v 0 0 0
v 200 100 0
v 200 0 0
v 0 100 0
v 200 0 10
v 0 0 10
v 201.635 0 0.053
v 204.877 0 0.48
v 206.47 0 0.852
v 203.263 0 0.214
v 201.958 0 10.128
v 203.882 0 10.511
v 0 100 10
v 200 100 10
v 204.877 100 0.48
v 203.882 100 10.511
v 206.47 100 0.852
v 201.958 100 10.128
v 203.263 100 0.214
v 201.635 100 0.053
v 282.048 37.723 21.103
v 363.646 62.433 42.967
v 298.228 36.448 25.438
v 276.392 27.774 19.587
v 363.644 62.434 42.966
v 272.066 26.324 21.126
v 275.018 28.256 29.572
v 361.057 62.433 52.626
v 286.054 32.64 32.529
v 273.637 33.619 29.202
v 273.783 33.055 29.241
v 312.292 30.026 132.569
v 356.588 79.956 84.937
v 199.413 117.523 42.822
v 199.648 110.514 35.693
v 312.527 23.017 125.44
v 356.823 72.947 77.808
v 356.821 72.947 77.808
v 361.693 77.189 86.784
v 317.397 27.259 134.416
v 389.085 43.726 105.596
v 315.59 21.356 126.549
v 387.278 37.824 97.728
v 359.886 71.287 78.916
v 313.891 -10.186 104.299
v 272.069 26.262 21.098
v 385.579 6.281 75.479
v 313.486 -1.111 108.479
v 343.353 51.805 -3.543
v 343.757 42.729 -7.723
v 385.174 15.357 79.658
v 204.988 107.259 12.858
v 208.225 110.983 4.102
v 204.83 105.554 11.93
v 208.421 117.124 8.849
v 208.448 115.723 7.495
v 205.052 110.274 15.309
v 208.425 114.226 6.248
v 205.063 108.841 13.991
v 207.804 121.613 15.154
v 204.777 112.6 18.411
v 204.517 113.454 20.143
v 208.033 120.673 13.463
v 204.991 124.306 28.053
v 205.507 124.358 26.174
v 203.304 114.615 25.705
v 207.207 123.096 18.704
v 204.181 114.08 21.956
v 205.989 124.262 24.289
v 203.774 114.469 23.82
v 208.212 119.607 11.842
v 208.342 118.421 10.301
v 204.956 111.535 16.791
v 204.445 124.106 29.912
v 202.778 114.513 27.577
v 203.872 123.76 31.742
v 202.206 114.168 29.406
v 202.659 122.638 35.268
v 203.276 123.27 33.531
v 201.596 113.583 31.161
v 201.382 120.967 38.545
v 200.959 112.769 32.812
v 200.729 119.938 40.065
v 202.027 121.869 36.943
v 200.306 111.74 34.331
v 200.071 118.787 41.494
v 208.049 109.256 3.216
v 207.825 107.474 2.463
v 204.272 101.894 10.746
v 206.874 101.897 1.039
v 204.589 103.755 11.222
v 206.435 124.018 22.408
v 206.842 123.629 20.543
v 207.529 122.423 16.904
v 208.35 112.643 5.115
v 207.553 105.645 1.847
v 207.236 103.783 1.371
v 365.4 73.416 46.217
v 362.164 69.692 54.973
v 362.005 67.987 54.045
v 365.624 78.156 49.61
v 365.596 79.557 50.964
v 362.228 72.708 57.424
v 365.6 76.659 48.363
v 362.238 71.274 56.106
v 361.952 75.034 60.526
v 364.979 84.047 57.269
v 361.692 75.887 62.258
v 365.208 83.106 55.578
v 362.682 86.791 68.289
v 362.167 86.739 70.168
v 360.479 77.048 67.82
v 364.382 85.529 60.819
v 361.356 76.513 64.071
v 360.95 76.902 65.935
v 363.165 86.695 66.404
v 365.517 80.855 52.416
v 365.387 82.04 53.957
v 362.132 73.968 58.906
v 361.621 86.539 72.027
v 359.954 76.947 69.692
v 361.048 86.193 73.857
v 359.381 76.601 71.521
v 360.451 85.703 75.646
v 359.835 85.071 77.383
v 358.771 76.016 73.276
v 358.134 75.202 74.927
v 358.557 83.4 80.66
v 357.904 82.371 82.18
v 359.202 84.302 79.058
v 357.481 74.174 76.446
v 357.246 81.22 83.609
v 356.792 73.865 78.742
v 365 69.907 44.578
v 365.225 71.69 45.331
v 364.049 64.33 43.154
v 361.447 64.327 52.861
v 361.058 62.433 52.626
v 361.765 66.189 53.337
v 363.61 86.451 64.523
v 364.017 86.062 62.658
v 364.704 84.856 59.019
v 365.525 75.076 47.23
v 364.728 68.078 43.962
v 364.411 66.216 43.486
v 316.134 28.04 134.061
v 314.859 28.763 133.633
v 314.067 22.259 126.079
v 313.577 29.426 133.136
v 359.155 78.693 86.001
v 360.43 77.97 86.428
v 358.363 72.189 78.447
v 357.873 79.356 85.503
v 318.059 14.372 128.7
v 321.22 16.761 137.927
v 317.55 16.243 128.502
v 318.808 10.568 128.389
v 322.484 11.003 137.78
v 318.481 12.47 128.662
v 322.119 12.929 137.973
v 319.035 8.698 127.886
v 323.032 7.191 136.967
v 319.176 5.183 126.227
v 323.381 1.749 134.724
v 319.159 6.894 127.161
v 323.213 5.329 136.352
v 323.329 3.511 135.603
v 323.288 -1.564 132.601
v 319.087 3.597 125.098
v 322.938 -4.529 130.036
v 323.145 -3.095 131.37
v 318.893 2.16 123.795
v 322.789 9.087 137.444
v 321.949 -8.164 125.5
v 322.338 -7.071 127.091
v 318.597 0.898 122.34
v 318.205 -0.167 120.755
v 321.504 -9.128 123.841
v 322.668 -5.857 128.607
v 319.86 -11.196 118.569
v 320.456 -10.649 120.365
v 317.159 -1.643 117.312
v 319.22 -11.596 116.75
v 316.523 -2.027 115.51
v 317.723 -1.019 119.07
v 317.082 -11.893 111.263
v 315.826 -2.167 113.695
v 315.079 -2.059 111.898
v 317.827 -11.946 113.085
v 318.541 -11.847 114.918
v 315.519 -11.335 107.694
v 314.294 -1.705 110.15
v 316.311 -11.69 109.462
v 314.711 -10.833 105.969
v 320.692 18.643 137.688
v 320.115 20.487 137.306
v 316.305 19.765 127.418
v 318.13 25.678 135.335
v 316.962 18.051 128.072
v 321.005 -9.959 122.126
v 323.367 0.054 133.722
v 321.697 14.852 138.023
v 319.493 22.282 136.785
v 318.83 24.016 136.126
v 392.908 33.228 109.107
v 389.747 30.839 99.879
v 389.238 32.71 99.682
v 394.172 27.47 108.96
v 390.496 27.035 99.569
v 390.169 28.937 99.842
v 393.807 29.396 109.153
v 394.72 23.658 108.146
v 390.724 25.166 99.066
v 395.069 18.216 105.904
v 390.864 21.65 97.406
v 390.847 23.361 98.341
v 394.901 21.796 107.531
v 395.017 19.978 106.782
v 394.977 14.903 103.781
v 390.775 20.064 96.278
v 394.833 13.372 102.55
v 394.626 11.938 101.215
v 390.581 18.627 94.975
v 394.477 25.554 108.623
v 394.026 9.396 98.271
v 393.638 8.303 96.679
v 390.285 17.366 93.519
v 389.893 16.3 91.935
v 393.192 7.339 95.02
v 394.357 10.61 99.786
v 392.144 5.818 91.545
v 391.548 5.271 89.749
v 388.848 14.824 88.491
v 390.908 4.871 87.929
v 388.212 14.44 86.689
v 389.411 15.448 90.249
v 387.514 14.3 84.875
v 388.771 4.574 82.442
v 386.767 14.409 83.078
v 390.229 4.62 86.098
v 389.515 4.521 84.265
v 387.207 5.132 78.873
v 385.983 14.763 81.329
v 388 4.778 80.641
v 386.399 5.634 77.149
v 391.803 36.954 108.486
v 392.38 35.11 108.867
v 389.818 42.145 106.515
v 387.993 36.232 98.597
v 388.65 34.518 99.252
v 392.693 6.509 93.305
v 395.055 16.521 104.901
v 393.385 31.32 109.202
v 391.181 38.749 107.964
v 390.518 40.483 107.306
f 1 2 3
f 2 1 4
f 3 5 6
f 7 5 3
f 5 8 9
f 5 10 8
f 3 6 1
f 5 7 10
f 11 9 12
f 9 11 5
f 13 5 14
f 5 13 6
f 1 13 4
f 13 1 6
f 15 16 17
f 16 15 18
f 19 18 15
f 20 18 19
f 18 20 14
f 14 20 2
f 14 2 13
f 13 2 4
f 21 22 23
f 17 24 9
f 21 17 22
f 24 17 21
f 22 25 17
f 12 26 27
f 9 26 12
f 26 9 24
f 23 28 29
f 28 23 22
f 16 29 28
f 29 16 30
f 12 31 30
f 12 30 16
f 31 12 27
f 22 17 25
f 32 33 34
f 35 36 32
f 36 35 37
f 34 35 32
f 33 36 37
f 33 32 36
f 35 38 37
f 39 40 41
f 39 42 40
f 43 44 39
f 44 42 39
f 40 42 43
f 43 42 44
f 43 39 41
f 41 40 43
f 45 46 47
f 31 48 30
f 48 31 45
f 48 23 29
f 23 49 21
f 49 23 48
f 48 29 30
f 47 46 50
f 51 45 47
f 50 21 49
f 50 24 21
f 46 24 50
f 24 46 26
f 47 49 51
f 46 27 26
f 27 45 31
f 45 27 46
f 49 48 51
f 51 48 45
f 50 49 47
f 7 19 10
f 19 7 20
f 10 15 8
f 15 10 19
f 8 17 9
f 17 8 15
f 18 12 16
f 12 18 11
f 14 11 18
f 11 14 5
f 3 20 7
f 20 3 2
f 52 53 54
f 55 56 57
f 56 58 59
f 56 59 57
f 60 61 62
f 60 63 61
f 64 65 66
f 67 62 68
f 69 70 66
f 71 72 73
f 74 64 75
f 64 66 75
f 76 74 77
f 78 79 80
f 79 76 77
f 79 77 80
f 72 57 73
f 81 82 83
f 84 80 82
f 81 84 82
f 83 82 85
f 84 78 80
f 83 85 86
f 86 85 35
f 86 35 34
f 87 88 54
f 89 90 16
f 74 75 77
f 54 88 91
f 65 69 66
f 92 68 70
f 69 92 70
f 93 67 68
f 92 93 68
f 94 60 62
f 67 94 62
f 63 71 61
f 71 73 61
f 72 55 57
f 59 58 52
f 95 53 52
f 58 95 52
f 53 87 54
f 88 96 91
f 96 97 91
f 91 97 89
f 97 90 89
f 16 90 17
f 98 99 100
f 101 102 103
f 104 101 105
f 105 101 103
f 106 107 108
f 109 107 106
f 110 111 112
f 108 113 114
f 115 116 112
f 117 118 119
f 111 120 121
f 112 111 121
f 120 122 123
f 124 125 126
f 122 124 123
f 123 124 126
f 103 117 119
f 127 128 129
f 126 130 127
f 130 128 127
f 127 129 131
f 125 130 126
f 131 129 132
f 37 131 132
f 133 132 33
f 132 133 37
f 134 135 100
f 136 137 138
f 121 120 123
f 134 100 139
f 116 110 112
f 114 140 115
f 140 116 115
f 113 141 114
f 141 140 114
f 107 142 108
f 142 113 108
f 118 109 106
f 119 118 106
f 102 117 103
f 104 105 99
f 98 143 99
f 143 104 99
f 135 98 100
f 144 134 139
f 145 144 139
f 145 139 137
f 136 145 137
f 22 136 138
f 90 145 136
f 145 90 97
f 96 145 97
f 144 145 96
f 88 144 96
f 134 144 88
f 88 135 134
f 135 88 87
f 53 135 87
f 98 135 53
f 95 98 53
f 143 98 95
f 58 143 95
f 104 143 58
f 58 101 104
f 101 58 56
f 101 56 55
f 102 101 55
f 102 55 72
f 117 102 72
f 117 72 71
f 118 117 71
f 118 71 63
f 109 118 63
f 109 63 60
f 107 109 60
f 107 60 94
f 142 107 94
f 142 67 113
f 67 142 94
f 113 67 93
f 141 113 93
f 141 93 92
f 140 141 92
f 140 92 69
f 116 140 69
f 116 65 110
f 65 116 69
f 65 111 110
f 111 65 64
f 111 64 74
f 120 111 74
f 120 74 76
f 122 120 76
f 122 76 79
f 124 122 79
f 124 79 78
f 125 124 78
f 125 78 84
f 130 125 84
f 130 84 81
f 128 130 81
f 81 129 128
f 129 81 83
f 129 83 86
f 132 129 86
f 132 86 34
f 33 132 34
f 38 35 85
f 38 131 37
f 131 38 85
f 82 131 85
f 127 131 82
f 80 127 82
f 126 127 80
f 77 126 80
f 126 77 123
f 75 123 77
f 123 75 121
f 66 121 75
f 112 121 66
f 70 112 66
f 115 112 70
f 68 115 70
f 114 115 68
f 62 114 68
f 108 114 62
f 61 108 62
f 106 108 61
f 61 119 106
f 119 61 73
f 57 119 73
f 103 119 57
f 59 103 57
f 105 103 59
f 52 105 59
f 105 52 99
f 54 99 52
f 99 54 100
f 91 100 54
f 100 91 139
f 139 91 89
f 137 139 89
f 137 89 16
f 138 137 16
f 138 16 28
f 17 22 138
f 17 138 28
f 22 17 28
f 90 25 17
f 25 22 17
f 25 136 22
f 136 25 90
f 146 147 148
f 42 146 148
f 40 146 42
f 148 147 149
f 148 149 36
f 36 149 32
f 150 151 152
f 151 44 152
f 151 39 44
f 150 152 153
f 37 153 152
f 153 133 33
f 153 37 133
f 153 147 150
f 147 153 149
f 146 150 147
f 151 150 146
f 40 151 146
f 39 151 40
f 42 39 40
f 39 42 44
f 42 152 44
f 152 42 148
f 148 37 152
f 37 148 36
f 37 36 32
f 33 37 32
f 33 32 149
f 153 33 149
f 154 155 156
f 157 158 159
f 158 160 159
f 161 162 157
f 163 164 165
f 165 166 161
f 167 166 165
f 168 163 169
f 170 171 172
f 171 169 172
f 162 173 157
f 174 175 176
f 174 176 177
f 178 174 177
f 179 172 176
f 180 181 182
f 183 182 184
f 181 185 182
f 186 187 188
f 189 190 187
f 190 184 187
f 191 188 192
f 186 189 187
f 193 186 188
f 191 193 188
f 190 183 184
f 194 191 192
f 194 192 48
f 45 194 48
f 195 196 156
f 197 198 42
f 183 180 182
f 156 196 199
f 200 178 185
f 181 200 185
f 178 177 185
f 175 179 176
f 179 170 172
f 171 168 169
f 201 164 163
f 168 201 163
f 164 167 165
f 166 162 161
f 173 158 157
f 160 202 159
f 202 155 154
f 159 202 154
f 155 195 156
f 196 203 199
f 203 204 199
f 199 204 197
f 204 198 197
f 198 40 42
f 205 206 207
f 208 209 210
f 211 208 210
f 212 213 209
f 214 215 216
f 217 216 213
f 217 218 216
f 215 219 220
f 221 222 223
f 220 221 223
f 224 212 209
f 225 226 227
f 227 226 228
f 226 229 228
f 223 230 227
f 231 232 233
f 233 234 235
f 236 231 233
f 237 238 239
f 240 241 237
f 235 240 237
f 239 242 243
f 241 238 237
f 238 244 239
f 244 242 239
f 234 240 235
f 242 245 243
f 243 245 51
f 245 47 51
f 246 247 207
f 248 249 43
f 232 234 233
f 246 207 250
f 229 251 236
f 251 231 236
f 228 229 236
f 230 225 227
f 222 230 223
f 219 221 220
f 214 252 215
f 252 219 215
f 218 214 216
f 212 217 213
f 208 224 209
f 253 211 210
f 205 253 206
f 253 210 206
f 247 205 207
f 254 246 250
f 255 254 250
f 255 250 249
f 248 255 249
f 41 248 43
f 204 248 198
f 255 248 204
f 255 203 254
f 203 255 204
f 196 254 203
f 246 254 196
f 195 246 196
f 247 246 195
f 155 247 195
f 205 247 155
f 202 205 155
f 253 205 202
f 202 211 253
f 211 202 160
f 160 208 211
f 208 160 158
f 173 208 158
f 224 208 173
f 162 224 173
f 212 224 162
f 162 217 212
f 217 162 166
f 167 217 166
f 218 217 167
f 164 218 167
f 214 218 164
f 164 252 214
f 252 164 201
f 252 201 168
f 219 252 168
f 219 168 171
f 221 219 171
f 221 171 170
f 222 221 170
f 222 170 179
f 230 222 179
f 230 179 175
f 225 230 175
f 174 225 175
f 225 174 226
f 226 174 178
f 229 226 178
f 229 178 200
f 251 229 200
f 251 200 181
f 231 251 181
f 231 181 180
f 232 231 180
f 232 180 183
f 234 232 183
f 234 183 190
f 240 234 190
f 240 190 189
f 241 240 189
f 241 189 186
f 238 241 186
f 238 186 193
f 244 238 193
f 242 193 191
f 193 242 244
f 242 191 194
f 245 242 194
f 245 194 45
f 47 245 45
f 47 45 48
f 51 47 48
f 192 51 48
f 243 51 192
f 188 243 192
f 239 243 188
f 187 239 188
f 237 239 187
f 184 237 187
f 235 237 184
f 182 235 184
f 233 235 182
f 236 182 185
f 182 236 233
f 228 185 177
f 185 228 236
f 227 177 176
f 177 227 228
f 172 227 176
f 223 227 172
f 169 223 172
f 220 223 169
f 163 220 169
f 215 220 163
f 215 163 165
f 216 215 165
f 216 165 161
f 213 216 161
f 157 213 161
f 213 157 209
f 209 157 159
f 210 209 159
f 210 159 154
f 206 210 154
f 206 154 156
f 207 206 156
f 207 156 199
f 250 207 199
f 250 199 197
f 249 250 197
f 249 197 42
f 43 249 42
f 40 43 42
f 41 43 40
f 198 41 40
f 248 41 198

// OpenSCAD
// Generated by Parametrix
ca_demoSheetFold2_SFG_pattern_000 = [ [ 0.0000, 0.0000 ],[ 200.0000, 0.0000 ],[ 205.2360, 0.0000 ],[ 367.9558, 62.4332 ],[ 378.4778, 108.0092 ],[ 383.3648, 108.0092 ],[ 427.5410, 124.5152 ],[ 470.6599, 153.5993 ],[ 553.5637, 209.5186 ],[ 509.3874, 275.0125 ],[ 426.4837, 219.0932 ],[ 383.3648, 190.0092 ],[ 378.4778, 190.0092 ],[ 215.7580, 145.5760 ],[ 205.2360, 100.0000 ],[ 200.0000, 100.0000 ],[ 0.0000, 100.0000 ],[ 0.0000, 0.0000 ] ];
cb_demoSheetFold2_SFG_pattern_000 = [  0, 1, 2, 3, 4, 5, 6, 7, 8, 9, 10, 11, 12, 13, 14, 15, 16, 17 ];
ca_demoSheetFold2_SFG_pattern_001 = [ [ 0.0000, 0.0000 ],[ 200.0000, 0.0000 ],[ 205.2360, 0.0000 ],[ 367.9558, 62.4332 ],[ 378.4778, 108.0092 ],[ 383.3648, 108.0092 ],[ 427.5410, 124.5152 ],[ 470.6599, 153.5993 ],[ 553.5637, 209.5186 ],[ 509.3874, 275.0125 ],[ 426.4837, 219.0932 ],[ 383.3648, 190.0092 ],[ 378.4778, 190.0092 ],[ 215.7580, 145.5760 ],[ 205.2360, 100.0000 ],[ 200.0000, 100.0000 ],[ 0.0000, 100.0000 ],[ 0.0000, 0.0000 ] ];
cb_demoSheetFold2_SFG_pattern_001 = [  18, 19, 20, 21, 22, 23, 24, 25, 26, 27, 28, 29, 30, 31, 32, 33, 34, 35 ];
ca_demoSheetFold2_SFG_pattern_002 = [ [ 204.2360, 49.0000 ],[ 204.4311, 49.0192 ],[ 204.6187, 49.0761 ],[ 204.7916, 49.1685 ],[ 204.9431, 49.2929 ],[ 205.0675, 49.4444 ],[ 205.1599, 49.6173 ],[ 205.2168, 49.8049 ],[ 205.2360, 50.0000 ],[ 205.2168, 50.1951 ],[ 205.1599, 50.3827 ],[ 205.0675, 50.5556 ],[ 204.9431, 50.7071 ],[ 204.7916, 50.8315 ],[ 204.6187, 50.9239 ],[ 204.4311, 50.9808 ],[ 204.2360, 51.0000 ],[ 201.0000, 51.0000 ],[ 200.8049, 50.9808 ],[ 200.6173, 50.9239 ],[ 200.4444, 50.8315 ],[ 200.2929, 50.7071 ],[ 200.1685, 50.5556 ],[ 200.0761, 50.3827 ],[ 200.0192, 50.1951 ],[ 200.0000, 50.0000 ],[ 200.0192, 49.8049 ],[ 200.0761, 49.6173 ],[ 200.1685, 49.4444 ],[ 200.2929, 49.2929 ],[ 200.4444, 49.1685 ],[ 200.6173, 49.0761 ],[ 200.8049, 49.0192 ],[ 201.0000, 49.0000 ],[ 204.2360, 49.0000 ] ];
cb_demoSheetFold2_SFG_pattern_002 = [  36, 37, 38, 39, 40, 41, 42, 43, 44, 45, 46, 47, 48, 49, 50, 51, 52, 53, 54, 55, 56, 57, 58, 59, 60, 61, 62, 63, 64, 65, 66, 67, 68, 69, 70 ];
ca_demoSheetFold2_SFG_pattern_003 = [ [ 285.8465, 82.4159 ],[ 285.8217, 82.2330 ],[ 285.8310, 82.0487 ],[ 285.8740, 81.8693 ],[ 285.9492, 81.7008 ],[ 286.0541, 81.5490 ],[ 286.1852, 81.4190 ],[ 286.3378, 81.3153 ],[ 286.5069, 81.2415 ],[ 286.6868, 81.2000 ],[ 286.8711, 81.1922 ],[ 287.0538, 81.2185 ],[ 287.2285, 81.2778 ],[ 287.3894, 81.3683 ],[ 287.5308, 81.4868 ],[ 287.6482, 81.6292 ],[ 287.7373, 81.7908 ],[ 287.7952, 81.9660 ],[ 297.8674, 125.5933 ],[ 297.8921, 125.7761 ],[ 297.8828, 125.9604 ],[ 297.8398, 126.1399 ],[ 297.7646, 126.3084 ],[ 297.6597, 126.4602 ],[ 297.5287, 126.5902 ],[ 297.3760, 126.6938 ],[ 297.2069, 126.7677 ],[ 297.0271, 126.8092 ],[ 296.8427, 126.8169 ],[ 296.6600, 126.7907 ],[ 296.4853, 126.7313 ],[ 296.3245, 126.6409 ],[ 296.1830, 126.5224 ],[ 296.0657, 126.3799 ],[ 295.9765, 126.2184 ],[ 295.9186, 126.0432 ],[ 285.8465, 82.4159 ] ];
cb_demoSheetFold2_SFG_pattern_003 = [  71, 72, 73, 74, 75, 76, 77, 78, 79, 80, 81, 82, 83, 84, 85, 86, 87, 88, 89, 90, 91, 92, 93, 94, 95, 96, 97, 98, 99, 100, 101, 102, 103, 104, 105, 106, 107 ];
ca_demoSheetFold2_SFG_pattern_004 = [ [ 382.3648, 148.0092 ],[ 382.5598, 148.0284 ],[ 382.7474, 148.0853 ],[ 382.9203, 148.1777 ],[ 383.0719, 148.3021 ],[ 383.1962, 148.4536 ],[ 383.2886, 148.6265 ],[ 383.3455, 148.8141 ],[ 383.3648, 149.0092 ],[ 383.3455, 149.2043 ],[ 383.2886, 149.3918 ],[ 383.1962, 149.5647 ],[ 383.0719, 149.7163 ],[ 382.9203, 149.8406 ],[ 382.7474, 149.9330 ],[ 382.5598, 149.9899 ],[ 382.3648, 150.0092 ],[ 379.4778, 150.0092 ],[ 379.2827, 149.9899 ],[ 379.0952, 149.9330 ],[ 378.9223, 149.8406 ],[ 378.7707, 149.7163 ],[ 378.6464, 149.5647 ],[ 378.5540, 149.3918 ],[ 378.4970, 149.2043 ],[ 378.4778, 149.0092 ],[ 378.4970, 148.8141 ],[ 378.5540, 148.6265 ],[ 378.6464, 148.4536 ],[ 378.7707, 148.3021 ],[ 378.9223, 148.1777 ],[ 379.0952, 148.0853 ],[ 379.2827, 148.0284 ],[ 379.4778, 148.0092 ],[ 382.3648, 148.0092 ] ];
cb_demoSheetFold2_SFG_pattern_004 = [  108, 109, 110, 111, 112, 113, 114, 115, 116, 117, 118, 119, 120, 121, 122, 123, 124, 125, 126, 127, 128, 129, 130, 131, 132, 133, 134, 135, 136, 137, 138, 139, 140, 141, 142 ];
ca_demoSheetFold2_SFG_pattern_005 = [ [ 448.3019, 184.9580 ],[ 448.4448, 185.0749 ],[ 448.5637, 185.2160 ],[ 448.6546, 185.3766 ],[ 448.7145, 185.5511 ],[ 448.7413, 185.7337 ],[ 448.7341, 185.9181 ],[ 448.6932, 186.0980 ],[ 448.6199, 186.2674 ],[ 448.5167, 186.4204 ],[ 448.3871, 186.5518 ],[ 448.2356, 186.6572 ],[ 448.0674, 186.7329 ],[ 447.8880, 186.7765 ],[ 447.7038, 186.7863 ],[ 447.5208, 186.7621 ],[ 447.3454, 186.7047 ],[ 447.1836, 186.6161 ],[ 405.7227, 158.6504 ],[ 405.5717, 158.5254 ],[ 405.4480, 158.3733 ],[ 405.3564, 158.2000 ],[ 405.3003, 158.0122 ],[ 405.2819, 157.8170 ],[ 405.3020, 157.6220 ],[ 405.3597, 157.4347 ],[ 405.4529, 157.2622 ],[ 405.5779, 157.1112 ],[ 405.7300, 156.9875 ],[ 405.9033, 156.8958 ],[ 406.0911, 156.8397 ],[ 406.2863, 156.8214 ],[ 406.4813, 156.8414 ],[ 406.6686, 156.8992 ],[ 406.8411, 156.9923 ],[ 448.3019, 184.9580 ] ];
cb_demoSheetFold2_SFG_pattern_005 = [  143, 144, 145, 146, 147, 148, 149, 150, 151, 152, 153, 154, 155, 156, 157, 158, 159, 160, 161, 162, 163, 164, 165, 166, 167, 168, 169, 170, 171, 172, 173, 174, 175, 176, 177, 178 ];
a_demoSheetFold2_SFG_pattern = concat(ca_demoSheetFold2_SFG_pattern_000, ca_demoSheetFold2_SFG_pattern_001, ca_demoSheetFold2_SFG_pattern_002, ca_demoSheetFold2_SFG_pattern_003, ca_demoSheetFold2_SFG_pattern_004, ca_demoSheetFold2_SFG_pattern_005);
b_demoSheetFold2_SFG_pattern = [cb_demoSheetFold2_SFG_pattern_000, cb_demoSheetFold2_SFG_pattern_001, cb_demoSheetFold2_SFG_pattern_002, cb_demoSheetFold2_SFG_pattern_003, cb_demoSheetFold2_SFG_pattern_004, cb_demoSheetFold2_SFG_pattern_005];
ca_demoSheetFold2_SFG_profiles_000 = [ [ 0.0000, 0.0000 ],[ 200.0000, 0.0000 ],[ 200.0000, 10.0000 ],[ 0.0000, 10.0000 ],[ 0.0000, 0.0000 ] ];
cb_demoSheetFold2_SFG_profiles_000 = [  0, 1, 2, 3, 4 ];
ca_demoSheetFold2_SFG_profiles_001 = [ [ 200.0000, 0.0000 ],[ 201.6351, 0.0535 ],[ 203.2632, 0.2139 ],[ 204.8773, 0.4804 ],[ 206.4705, 0.8519 ],[ 203.8823, 10.5111 ],[ 201.9579, 10.1283 ],[ 200.0000, 10.0000 ],[ 200.0000, 0.0000 ] ];
cb_demoSheetFold2_SFG_profiles_001 = [  5, 6, 7, 8, 9, 10, 11, 12, 13 ];
ca_demoSheetFold2_SFG_profiles_002 = [ [ 206.4705, 0.8519 ],[ 374.8179, 45.9604 ],[ 372.2297, 55.6197 ],[ 203.8823, 10.5111 ],[ 206.4705, 0.8519 ] ];
cb_demoSheetFold2_SFG_profiles_002 = [  14, 15, 16, 17, 18 ];
ca_demoSheetFold2_SFG_profiles_003 = [ [ 374.8179, 45.9604 ],[ 376.6789, 46.5377 ],[ 378.4893, 47.2581 ],[ 380.2380, 48.1173 ],[ 381.9146, 49.1102 ],[ 383.5087, 50.2305 ],[ 385.0107, 51.4717 ],[ 386.4115, 52.8260 ],[ 387.7026, 54.2853 ],[ 388.8761, 55.8407 ],[ 389.9250, 57.4828 ],[ 390.8427, 59.2016 ],[ 391.6238, 60.9866 ],[ 392.2635, 62.8271 ],[ 392.7580, 64.7118 ],[ 393.1041, 66.6292 ],[ 393.2999, 68.5678 ],[ 393.3441, 70.5158 ],[ 393.2365, 72.4613 ],[ 392.9776, 74.3925 ],[ 392.5692, 76.2976 ],[ 392.0136, 78.1652 ],[ 391.3143, 79.9838 ],[ 390.4755, 81.7425 ],[ 389.5022, 83.4305 ],[ 388.4005, 85.0375 ],[ 387.1769, 86.5539 ],[ 385.8390, 87.9704 ],[ 384.3948, 89.2784 ],[ 382.8531, 90.4699 ],[ 381.2234, 91.5377 ],[ 376.0730, 82.9661 ],[ 377.6738, 81.8567 ],[ 379.1173, 80.5493 ],[ 380.3793, 79.0659 ],[ 381.4384, 77.4315 ],[ 382.2769, 75.6737 ],[ 382.8805, 73.8220 ],[ 383.2391, 71.9077 ],[ 383.3467, 69.9631 ],[ 383.2014, 68.0210 ],[ 382.8058, 66.1140 ],[ 382.1663, 64.2744 ],[ 381.2939, 62.5331 ],[ 380.2033, 60.9195 ],[ 378.9128, 59.4609 ],[ 377.4442, 58.1817 ],[ 375.8222, 57.1037 ],[ 374.0742, 56.2448 ],[ 372.2297, 55.6197 ],[ 374.8179, 45.9604 ] ];
cb_demoSheetFold2_SFG_profiles_003 = [  19, 20, 21, 22, 23, 24, 25, 26, 27, 28, 29, 30, 31, 32, 33, 34, 35, 36, 37, 38, 39, 40, 41, 42, 43, 44, 45, 46, 47, 48, 49, 50, 51, 52, 53, 54, 55, 56, 57, 58, 59, 60, 61, 62, 63, 64, 65, 66, 67, 68, 69 ];
ca_demoSheetFold2_SFG_profiles_004 = [ [ 381.2234, 91.5377 ],[ 380.3662, 92.0528 ],[ 375.2158, 83.4811 ],[ 376.0730, 82.9661 ],[ 381.2234, 91.5377 ] ];
cb_demoSheetFold2_SFG_profiles_004 = [  70, 71, 72, 73, 74 ];
ca_demoSheetFold2_SFG_profiles_005 = [ [ 380.3662, 92.0528 ],[ 379.0340, 92.7989 ],[ 377.6587, 93.4622 ],[ 376.2454, 94.0404 ],[ 374.7995, 94.5312 ],[ 371.8758, 84.9682 ],[ 373.5913, 84.3268 ],[ 375.2158, 83.4811 ],[ 380.3662, 92.0528 ] ];
cb_demoSheetFold2_SFG_profiles_005 = [  75, 76, 77, 78, 79, 80, 81, 82, 83 ];
ca_demoSheetFold2_SFG_profiles_006 = [ [ 374.7995, 94.5312 ],[ 329.7010, 108.3192 ],[ 326.7773, 98.7562 ],[ 371.8758, 84.9682 ],[ 374.7995, 94.5312 ] ];
cb_demoSheetFold2_SFG_profiles_006 = [  84, 85, 86, 87, 88 ];
ca_demoSheetFold2_SFG_profiles_007 = [ [ 329.7010, 108.3192 ],[ 327.7962, 108.8204 ],[ 325.8579, 109.1701 ],[ 323.8981, 109.3662 ],[ 321.9289, 109.4073 ],[ 319.9626, 109.2933 ],[ 318.0114, 109.0249 ],[ 316.0874, 108.6037 ],[ 314.2025, 108.0323 ],[ 312.3684, 107.3143 ],[ 310.5966, 106.4542 ],[ 308.8979, 105.4572 ],[ 307.2830, 104.3296 ],[ 305.7619, 103.0784 ],[ 304.3440, 101.7114 ],[ 303.0382, 100.2369 ],[ 301.8524, 98.6642 ],[ 300.7941, 97.0031 ],[ 299.8699, 95.2638 ],[ 299.0855, 93.4572 ],[ 298.4458, 91.5944 ],[ 297.9546, 89.6870 ],[ 297.6152, 87.7468 ],[ 297.4295, 85.7860 ],[ 297.3988, 83.8167 ],[ 297.5232, 81.8510 ],[ 297.8019, 79.9012 ],[ 298.2333, 77.9795 ],[ 298.8146, 76.0976 ],[ 299.5423, 74.2674 ],[ 300.4118, 72.5001 ],[ 301.4177, 70.8067 ],[ 302.5538, 69.1978 ],[ 303.8131, 67.6833 ],[ 311.2445, 74.3746 ],[ 310.0372, 75.9047 ],[ 309.0385, 77.5784 ],[ 308.2652, 79.3675 ],[ 307.7305, 81.2417 ],[ 307.4432, 83.1695 ],[ 307.4083, 85.1182 ],[ 307.6264, 87.0550 ],[ 308.0938, 88.9472 ],[ 308.8026, 90.7627 ],[ 309.7408, 92.4711 ],[ 310.8926, 94.0434 ],[ 312.2386, 95.4531 ],[ 313.7559, 96.6763 ],[ 315.4191, 97.6925 ],[ 317.1999, 98.4845 ],[ 319.0685, 99.0388 ],[ 320.9931, 99.3463 ],[ 322.9413, 99.4015 ],[ 324.8803, 99.2037 ],[ 326.7773, 98.7562 ],[ 329.7010, 108.3192 ] ];
cb_demoSheetFold2_SFG_profiles_007 = [  89, 90, 91, 92, 93, 94, 95, 96, 97, 98, 99, 100, 101, 102, 103, 104, 105, 106, 107, 108, 109, 110, 111, 112, 113, 114, 115, 116, 117, 118, 119, 120, 121, 122, 123, 124, 125, 126, 127, 128, 129, 130, 131, 132, 133, 134, 135, 136, 137, 138, 139, 140, 141, 142, 143, 144 ];
ca_demoSheetFold2_SFG_profiles_008 = [ [ 303.8131, 67.6833 ],[ 370.7261, -6.6311 ],[ 378.1576, 0.0602 ],[ 311.2445, 74.3746 ],[ 303.8131, 67.6833 ] ];
cb_demoSheetFold2_SFG_profiles_008 = [  145, 146, 147, 148, 149 ];
ca_demoSheetFold2_SFG_profiles_009 = [ [ 0.0000, 400.0000 ],[ 200.0000, 400.0000 ],[ 200.0000, 410.0000 ],[ 0.0000, 410.0000 ],[ 0.0000, 400.0000 ] ];
cb_demoSheetFold2_SFG_profiles_009 = [  150, 151, 152, 153, 154 ];
ca_demoSheetFold2_SFG_profiles_010 = [ [ 200.0000, 400.0000 ],[ 201.6351, 400.0535 ],[ 203.2632, 400.2139 ],[ 204.8773, 400.4804 ],[ 206.4705, 400.8519 ],[ 203.8823, 410.5111 ],[ 201.9579, 410.1283 ],[ 200.0000, 410.0000 ],[ 200.0000, 400.0000 ] ];
cb_demoSheetFold2_SFG_profiles_010 = [  155, 156, 157, 158, 159, 160, 161, 162, 163 ];
ca_demoSheetFold2_SFG_profiles_011 = [ [ 206.4705, 400.8519 ],[ 207.4364, 401.1107 ],[ 204.8482, 410.7699 ],[ 203.8823, 410.5111 ],[ 206.4705, 400.8519 ] ];
cb_demoSheetFold2_SFG_profiles_011 = [  164, 165, 166, 167, 168 ];
ca_demoSheetFold2_SFG_profiles_012 = [ [ 207.4364, 401.1107 ],[ 209.2974, 401.6879 ],[ 211.1078, 402.4084 ],[ 212.8565, 403.2676 ],[ 214.5331, 404.2604 ],[ 216.1272, 405.3808 ],[ 217.6292, 406.6219 ],[ 219.0301, 407.9762 ],[ 220.3211, 409.4356 ],[ 221.4947, 410.9910 ],[ 222.5435, 412.6331 ],[ 223.4612, 414.3519 ],[ 224.2423, 416.1369 ],[ 224.8820, 417.9773 ],[ 225.3765, 419.8620 ],[ 225.7226, 421.7795 ],[ 225.9184, 423.7181 ],[ 225.9626, 425.6660 ],[ 225.8550, 427.6115 ],[ 225.5962, 429.5427 ],[ 225.1877, 431.4479 ],[ 224.6322, 433.3155 ],[ 223.9328, 435.1341 ],[ 223.0940, 436.8927 ],[ 222.1208, 438.5807 ],[ 221.0190, 440.1878 ],[ 219.7954, 441.7042 ],[ 218.4575, 443.1206 ],[ 217.0133, 444.4286 ],[ 215.4717, 445.6201 ],[ 213.8419, 446.6880 ],[ 208.6915, 438.1163 ],[ 210.2923, 437.0070 ],[ 211.7358, 435.6996 ],[ 212.9978, 434.2162 ],[ 214.0569, 432.5818 ],[ 214.8954, 430.8239 ],[ 215.4990, 428.9723 ],[ 215.8576, 427.0580 ],[ 215.9652, 425.1134 ],[ 215.8199, 423.1712 ],[ 215.4243, 421.2643 ],[ 214.7848, 419.4246 ],[ 213.9125, 417.6834 ],[ 212.8218, 416.0698 ],[ 211.5313, 414.6112 ],[ 210.0627, 413.3320 ],[ 208.4407, 412.2539 ],[ 206.6927, 411.3951 ],[ 204.8482, 410.7699 ],[ 207.4364, 401.1107 ] ];
cb_demoSheetFold2_SFG_profiles_012 = [  169, 170, 171, 172, 173, 174, 175, 176, 177, 178, 179, 180, 181, 182, 183, 184, 185, 186, 187, 188, 189, 190, 191, 192, 193, 194, 195, 196, 197, 198, 199, 200, 201, 202, 203, 204, 205, 206, 207, 208, 209, 210, 211, 212, 213, 214, 215, 216, 217, 218, 219 ];
ca_demoSheetFold2_SFG_profiles_013 = [ [ 213.8419, 446.6880 ],[ 69.2572, 533.5632 ],[ 64.1068, 524.9916 ],[ 208.6915, 438.1163 ],[ 213.8419, 446.6880 ] ];
cb_demoSheetFold2_SFG_profiles_013 = [  220, 221, 222, 223, 224 ];
ca_demoSheetFold2_SFG_profiles_014 = [ [ 69.2572, 533.5632 ],[ 67.9250, 534.3093 ],[ 66.5497, 534.9727 ],[ 65.1364, 535.5509 ],[ 63.6905, 536.0417 ],[ 60.7668, 526.4786 ],[ 62.4823, 525.8372 ],[ 64.1068, 524.9916 ],[ 69.2572, 533.5632 ] ];
cb_demoSheetFold2_SFG_profiles_014 = [  225, 226, 227, 228, 229, 230, 231, 232, 233 ];
ca_demoSheetFold2_SFG_profiles_015 = [ [ 63.6905, 536.0417 ],[ 62.7342, 536.3341 ],[ 59.8105, 526.7710 ],[ 60.7668, 526.4786 ],[ 63.6905, 536.0417 ] ];
cb_demoSheetFold2_SFG_profiles_015 = [  234, 235, 236, 237, 238 ];
ca_demoSheetFold2_SFG_profiles_016 = [ [ 62.7342, 536.3341 ],[ 60.8295, 536.8353 ],[ 58.8912, 537.1850 ],[ 56.9313, 537.3810 ],[ 54.9622, 537.4222 ],[ 52.9959, 537.3082 ],[ 51.0447, 537.0397 ],[ 49.1206, 536.6185 ],[ 47.2357, 536.0471 ],[ 45.4017, 535.3291 ],[ 43.6298, 534.4690 ],[ 41.9312, 533.4721 ],[ 40.3163, 532.3445 ],[ 38.7952, 531.0933 ],[ 37.3773, 529.7262 ],[ 36.0714, 528.2517 ],[ 34.8856, 526.6791 ],[ 33.8274, 525.0179 ],[ 32.9032, 523.2786 ],[ 32.1188, 521.4720 ],[ 31.4790, 519.6092 ],[ 30.9879, 517.7018 ],[ 30.6484, 515.7617 ],[ 30.4627, 513.8009 ],[ 30.4320, 511.8315 ],[ 30.5564, 509.8658 ],[ 30.8352, 507.9161 ],[ 31.2666, 505.9943 ],[ 31.8479, 504.1124 ],[ 32.5756, 502.2822 ],[ 33.4450, 500.5149 ],[ 34.4510, 498.8216 ],[ 35.5871, 497.2126 ],[ 36.8463, 495.6982 ],[ 44.2778, 502.3895 ],[ 43.0705, 503.9196 ],[ 42.0717, 505.5933 ],[ 41.2985, 507.3823 ],[ 40.7637, 509.2566 ],[ 40.4764, 511.1843 ],[ 40.4416, 513.1330 ],[ 40.6597, 515.0698 ],[ 41.1271, 516.9620 ],[ 41.8359, 518.7776 ],[ 42.7741, 520.4859 ],[ 43.9259, 522.0582 ],[ 45.2718, 523.4679 ],[ 46.7891, 524.6912 ],[ 48.4523, 525.7073 ],[ 50.2332, 526.4993 ],[ 52.1017, 527.0537 ],[ 54.0263, 527.3611 ],[ 55.9746, 527.4164 ],[ 57.9136, 527.2186 ],[ 59.8105, 526.7710 ],[ 62.7342, 536.3341 ] ];
cb_demoSheetFold2_SFG_profiles_016 = [  239, 240, 241, 242, 243, 244, 245, 246, 247, 248, 249, 250, 251, 252, 253, 254, 255, 256, 257, 258, 259, 260, 261, 262, 263, 264, 265, 266, 267, 268, 269, 270, 271, 272, 273, 274, 275, 276, 277, 278, 279, 280, 281, 282, 283, 284, 285, 286, 287, 288, 289, 290, 291, 292, 293, 294 ];
ca_demoSheetFold2_SFG_profiles_017 = [ [ 36.8463, 495.6982 ],[ 103.7594, 421.3837 ],[ 111.1908, 428.0750 ],[ 44.2778, 502.3895 ],[ 36.8463, 495.6982 ] ];
cb_demoSheetFold2_SFG_profiles_017 = [  295, 296, 297, 298, 299 ];
a_demoSheetFold2_SFG_profiles = concat(ca_demoSheetFold2_SFG_profiles_000, ca_demoSheetFold2_SFG_profiles_001, ca_demoSheetFold2_SFG_profiles_002, ca_demoSheetFold2_SFG_profiles_003, ca_demoSheetFold2_SFG_profiles_004, ca_demoSheetFold2_SFG_profiles_005, ca_demoSheetFold2_SFG_profiles_006, ca_demoSheetFold2_SFG_profiles_007, ca_demoSheetFold2_SFG_profiles_008, ca_demoSheetFold2_SFG_profiles_009, ca_demoSheetFold2_SFG_profiles_010, ca_demoSheetFold2_SFG_profiles_011, ca_demoSheetFold2_SFG_profiles_012, ca_demoSheetFold2_SFG_profiles_013, ca_demoSheetFold2_SFG_profiles_014, ca_demoSheetFold2_SFG_profiles_015, ca_demoSheetFold2_SFG_profiles_016, ca_demoSheetFold2_SFG_profiles_017);
b_demoSheetFold2_SFG_profiles = [cb_demoSheetFold2_SFG_profiles_000, cb_demoSheetFold2_SFG_profiles_001, cb_demoSheetFold2_SFG_profiles_002, cb_demoSheetFold2_SFG_profiles_003, cb_demoSheetFold2_SFG_profiles_004, cb_demoSheetFold2_SFG_profiles_005, cb_demoSheetFold2_SFG_profiles_006, cb_demoSheetFold2_SFG_profiles_007, cb_demoSheetFold2_SFG_profiles_008, cb_demoSheetFold2_SFG_profiles_009, cb_demoSheetFold2_SFG_profiles_010, cb_demoSheetFold2_SFG_profiles_011, cb_demoSheetFold2_SFG_profiles_012, cb_demoSheetFold2_SFG_profiles_013, cb_demoSheetFold2_SFG_profiles_014, cb_demoSheetFold2_SFG_profiles_015, cb_demoSheetFold2_SFG_profiles_016, cb_demoSheetFold2_SFG_profiles_017];
ca_demoSheetFold2_SFG_f00_000 = [ [ 0.0000, 0.0000 ],[ 200.0000, 0.0000 ],[ 200.0000, 100.0000 ],[ 0.0000, 100.0000 ],[ 0.0000, 0.0000 ] ];
cb_demoSheetFold2_SFG_f00_000 = [  0, 1, 2, 3, 4 ];
a_demoSheetFold2_SFG_f00 = concat(ca_demoSheetFold2_SFG_f00_000);
b_demoSheetFold2_SFG_f00 = [cb_demoSheetFold2_SFG_f00_000];
ca_demoSheetFold2_SFG_f01_000 = [ [ 0.0000, 100.0000 ],[ 0.0000, 0.0000 ],[ 162.7198, 62.4332 ],[ 0.0000, 100.0000 ] ];
cb_demoSheetFold2_SFG_f01_000 = [  0, 1, 2, 3 ];
a_demoSheetFold2_SFG_f01 = concat(ca_demoSheetFold2_SFG_f01_000);
b_demoSheetFold2_SFG_f01 = [cb_demoSheetFold2_SFG_f01_000];
ca_demoSheetFold2_SFG_f02_000 = [ [ 0.0000, 167.0000 ],[ -79.8983, 148.5540 ],[ 0.0000, 0.0000 ],[ 0.0000, 167.0000 ] ];
cb_demoSheetFold2_SFG_f02_000 = [  0, 1, 2, 3 ];
a_demoSheetFold2_SFG_f02 = concat(ca_demoSheetFold2_SFG_f02_000);
b_demoSheetFold2_SFG_f02 = [cb_demoSheetFold2_SFG_f02_000];
ca_demoSheetFold2_SFG_f03_000 = [ [ 0.0000, 82.0000 ],[ 0.0000, 0.0000 ],[ 44.1762, 16.5060 ],[ 0.0000, 82.0000 ] ];
cb_demoSheetFold2_SFG_f03_000 = [  0, 1, 2, 3 ];
a_demoSheetFold2_SFG_f03 = concat(ca_demoSheetFold2_SFG_f03_000);
b_demoSheetFold2_SFG_f03 = [cb_demoSheetFold2_SFG_f03_000];
ca_demoSheetFold2_SFG_f04_000 = [ [ -0.0000, 0.0000 ],[ 100.0000, 0.0000 ],[ 100.0000, 79.0000 ],[ -0.0000, 79.0000 ],[ -0.0000, 0.0000 ] ];
cb_demoSheetFold2_SFG_f04_000 = [  0, 1, 2, 3, 4 ];
a_demoSheetFold2_SFG_f04 = concat(ca_demoSheetFold2_SFG_f04_000);
b_demoSheetFold2_SFG_f04 = [cb_demoSheetFold2_SFG_f04_000];
ca_demoSheetFold2_SFG_fj00_000 = [ [ 0.0000, 0.0000 ],[ 1.6351, 0.0535 ],[ 3.2632, 0.2139 ],[ 4.8773, 0.4804 ],[ 6.4705, 0.8519 ],[ 3.8823, 10.5111 ],[ 1.9579, 10.1283 ],[ 0.0000, 10.0000 ],[ 0.0000, 0.0000 ] ];
cb_demoSheetFold2_SFG_fj00_000 = [  0, 1, 2, 3, 4, 5, 6, 7, 8 ];
a_demoSheetFold2_SFG_fj00 = concat(ca_demoSheetFold2_SFG_fj00_000);
b_demoSheetFold2_SFG_fj00 = [cb_demoSheetFold2_SFG_fj00_000];
ca_demoSheetFold2_SFG_fj01_000 = [ [ 0.0000, 0.0000 ],[ 1.9470, 0.0759 ],[ 3.8821, 0.3033 ],[ 5.7937, 0.6806 ],[ 7.6701, 1.2057 ],[ 9.4999, 1.8753 ],[ 11.2719, 2.6854 ],[ 12.9755, 3.6310 ],[ 14.6003, 4.7064 ],[ 16.1364, 5.9051 ],[ 17.5745, 7.2198 ],[ 18.9059, 8.6425 ],[ 20.1223, 10.1645 ],[ 21.2166, 11.7767 ],[ 22.1820, 13.4692 ],[ 23.0126, 15.2317 ],[ 23.7035, 17.0536 ],[ 24.2503, 18.9237 ],[ 24.6499, 20.8308 ],[ 24.8997, 22.7632 ],[ 24.9983, 24.7091 ],[ 24.9450, 26.6568 ],[ 24.7402, 28.5945 ],[ 24.3852, 30.5103 ],[ 23.8820, 32.3927 ],[ 23.2337, 34.2302 ],[ 22.4443, 36.0115 ],[ 21.5186, 37.7260 ],[ 20.4621, 39.3632 ],[ 19.2814, 40.9132 ],[ 17.9835, 42.3665 ],[ 10.7901, 35.4199 ],[ 12.0492, 33.9340 ],[ 13.1052, 32.2976 ],[ 13.9402, 30.5381 ],[ 14.5403, 28.6853 ],[ 14.8952, 26.7703 ],[ 14.9990, 24.8255 ],[ 14.8499, 22.8836 ],[ 14.4506, 20.9774 ],[ 13.8076, 19.1390 ],[ 12.9318, 17.3995 ],[ 11.8380, 15.7880 ],[ 10.5447, 14.3319 ],[ 9.0736, 13.0556 ],[ 7.4496, 11.9806 ],[ 5.6999, 11.1252 ],[ 3.8542, 10.5036 ],[ 1.9435, 10.1264 ],[ 0.0000, 10.0000 ],[ 0.0000, 0.0000 ] ];
cb_demoSheetFold2_SFG_fj01_000 = [  0, 1, 2, 3, 4, 5, 6, 7, 8, 9, 10, 11, 12, 13, 14, 15, 16, 17, 18, 19, 20, 21, 22, 23, 24, 25, 26, 27, 28, 29, 30, 31, 32, 33, 34, 35, 36, 37, 38, 39, 40, 41, 42, 43, 44, 45, 46, 47, 48, 49, 50 ];
a_demoSheetFold2_SFG_fj01 = concat(ca_demoSheetFold2_SFG_fj01_000);
b_demoSheetFold2_SFG_fj01 = [cb_demoSheetFold2_SFG_fj01_000];
ca_demoSheetFold2_SFG_fj02_000 = [ [ 0.0000, 0.0000 ],[ 1.5262, 0.0466 ],[ 3.0467, 0.1863 ],[ 4.5559, 0.4186 ],[ 6.0480, 0.7426 ],[ 3.6288, 10.4456 ],[ 1.8280, 10.1118 ],[ -0.0000, 10.0000 ],[ 0.0000, 0.0000 ] ];
cb_demoSheetFold2_SFG_fj02_000 = [  0, 1, 2, 3, 4, 5, 6, 7, 8 ];
a_demoSheetFold2_SFG_fj02 = concat(ca_demoSheetFold2_SFG_fj02_000);
b_demoSheetFold2_SFG_fj02 = [cb_demoSheetFold2_SFG_fj02_000];
ca_demoSheetFold2_SFG_fj03_000 = [ [ 0.0000, 0.0000 ],[ 1.9681, 0.0776 ],[ 3.9239, 0.3099 ],[ 5.8554, 0.6954 ],[ 7.7506, 1.2318 ],[ 9.5976, 1.9157 ],[ 11.3851, 2.7429 ],[ 13.1019, 3.7082 ],[ 14.7374, 4.8057 ],[ 16.2814, 6.0285 ],[ 17.7244, 7.3691 ],[ 19.0573, 8.8192 ],[ 20.2720, 10.3696 ],[ 21.3608, 12.0109 ],[ 22.3170, 13.7328 ],[ 23.1348, 15.5246 ],[ 23.8089, 17.3752 ],[ 24.3352, 19.2732 ],[ 24.7105, 21.2067 ],[ 24.9325, 23.1638 ],[ 24.9997, 25.1322 ],[ 24.9117, 27.0999 ],[ 24.6690, 29.0544 ],[ 24.2733, 30.9839 ],[ 23.7269, 32.8762 ],[ 23.0332, 34.7196 ],[ 22.1966, 36.5026 ],[ 21.2222, 38.2143 ],[ 20.1161, 39.8440 ],[ 18.8851, 41.3815 ],[ 17.5369, 42.8174 ],[ 16.0798, 44.1426 ],[ 14.5230, 45.3490 ],[ 12.8760, 46.4292 ],[ 7.7256, 37.8575 ],[ 9.3275, 36.7473 ],[ 10.7719, 35.4387 ],[ 12.0345, 33.9539 ],[ 13.0938, 32.3179 ],[ 13.9321, 30.5584 ],[ 14.5352, 28.7050 ],[ 14.8929, 26.7891 ],[ 14.9992, 24.8429 ],[ 14.8522, 22.8994 ],[ 14.4545, 20.9914 ],[ 13.8127, 19.1511 ],[ 12.9377, 17.4095 ],[ 11.8443, 15.7961 ],[ 10.5509, 14.3380 ],[ 9.0794, 13.0600 ],[ 7.4546, 11.9835 ],[ 5.7040, 11.1268 ],[ 3.8570, 10.5044 ],[ 1.9449, 10.1266 ],[ 0.0000, 10.0000 ],[ 0.0000, 0.0000 ] ];
cb_demoSheetFold2_SFG_fj03_000 = [  0, 1, 2, 3, 4, 5, 6, 7, 8, 9, 10, 11, 12, 13, 14, 15, 16, 17, 18, 19, 20, 21, 22, 23, 24, 25, 26, 27, 28, 29, 30, 31, 32, 33, 34, 35, 36, 37, 38, 39, 40, 41, 42, 43, 44, 45, 46, 47, 48, 49, 50, 51, 52, 53, 54, 55 ];
a_demoSheetFold2_SFG_fj03 = concat(ca_demoSheetFold2_SFG_fj03_000);
b_demoSheetFold2_SFG_fj03 = [cb_demoSheetFold2_SFG_fj03_000];

module subpax_demoSheetFold2_SFG_f00 () {
	translate( [ 0, 0, 0 ])
		rotate( [ 0, 0, 0 ])
			   linear_extrude(height = 10) polygon(a_demoSheetFold2_SFG_f00, b_demoSheetFold2_SFG_f00);
}

module subpax_demoSheetFold2_SFG_f01 () {
	translate( [ 206.47047612756302, -3.9620239392897057e-16, 0.8518543427732936 ])
		rotate( [ -9.400607950331846e-16, -14.999999999999998, 1.2376135155011165e-16 ])
			   linear_extrude(height = 10) polygon(a_demoSheetFold2_SFG_f01, b_demoSheetFold2_SFG_f01);
}

module subpax_demoSheetFold2_SFG_f02 () {
	translate( [ 199.412791887748, 117.52257919646428, 42.82173967200015 ])
		rotate( [ 160.5182014648272, 40.87301545000254, 63.523646598158784 ])
			   linear_extrude(height = 10) polygon(a_demoSheetFold2_SFG_f02, b_demoSheetFold2_SFG_f02);
}

module subpax_demoSheetFold2_SFG_f03 () {
	translate( [ 361.6931823621127, 77.1887426856568, 86.7837798345138 ])
		rotate( [ 143.56038746913293, -12.05181651562894, -32.81439291986959 ])
			   linear_extrude(height = 10) polygon(a_demoSheetFold2_SFG_f03, b_demoSheetFold2_SFG_f03);
}

module subpax_demoSheetFold2_SFG_f04 () {
	translate( [ 385.5789955996381, 6.280809970216597, 75.47871682992941 ])
		rotate( [ 41.11834988078595, 56.30607155419499, 138.92692720491317 ])
			   linear_extrude(height = 10) polygon(a_demoSheetFold2_SFG_f04, b_demoSheetFold2_SFG_f04);
}

module subpax_demoSheetFold2_SFG_fj00 () {
	translate( [ 200, 100, 0 ])
		rotate( [ 90, 0, 0 ])
			   linear_extrude(height = 100) polygon(a_demoSheetFold2_SFG_fj00, b_demoSheetFold2_SFG_fj00);
}

module subpax_demoSheetFold2_SFG_fj01 () {
	translate( [ 206.47047612756302, 100.00000000000003, 0.8518543427732936 ])
		rotate( [ 75.36774811734126, -3.3377404373504493, 77.42864850103878 ])
			   linear_extrude(height = 167) polygon(a_demoSheetFold2_SFG_fj01, b_demoSheetFold2_SFG_fj01);
}

module subpax_demoSheetFold2_SFG_fj02 () {
	translate( [ 312.29205296473714, 30.025656923156554, 132.56917158535296 ])
		rotate( [ -129.17495331389838, -23.13672226634786, -23.82428467806328 ])
			   linear_extrude(height = 82) polygon(a_demoSheetFold2_SFG_fj02, b_demoSheetFold2_SFG_fj02);
}

module subpax_demoSheetFold2_SFG_fj03 () {
	translate( [ 317.39718537928684, 27.258646487774563, 134.41622828058587 ])
		rotate( [ -114.87715882687297, -29.86286965210509, -64.06215398853192 ])
			   linear_extrude(height = 79) polygon(a_demoSheetFold2_SFG_fj03, b_demoSheetFold2_SFG_fj03);
}

module pax_demoSheetFold2 () {
	union () {
		subpax_demoSheetFold2_SFG_f00();
subpax_demoSheetFold2_SFG_f01();
subpax_demoSheetFold2_SFG_f02();
subpax_demoSheetFold2_SFG_f03();
subpax_demoSheetFold2_SFG_f04();
subpax_demoSheetFold2_SFG_fj00();
subpax_demoSheetFold2_SFG_fj01();
subpax_demoSheetFold2_SFG_fj02();
subpax_demoSheetFold2_SFG_fj03();
	}
}

pax_demoSheetFold2();
